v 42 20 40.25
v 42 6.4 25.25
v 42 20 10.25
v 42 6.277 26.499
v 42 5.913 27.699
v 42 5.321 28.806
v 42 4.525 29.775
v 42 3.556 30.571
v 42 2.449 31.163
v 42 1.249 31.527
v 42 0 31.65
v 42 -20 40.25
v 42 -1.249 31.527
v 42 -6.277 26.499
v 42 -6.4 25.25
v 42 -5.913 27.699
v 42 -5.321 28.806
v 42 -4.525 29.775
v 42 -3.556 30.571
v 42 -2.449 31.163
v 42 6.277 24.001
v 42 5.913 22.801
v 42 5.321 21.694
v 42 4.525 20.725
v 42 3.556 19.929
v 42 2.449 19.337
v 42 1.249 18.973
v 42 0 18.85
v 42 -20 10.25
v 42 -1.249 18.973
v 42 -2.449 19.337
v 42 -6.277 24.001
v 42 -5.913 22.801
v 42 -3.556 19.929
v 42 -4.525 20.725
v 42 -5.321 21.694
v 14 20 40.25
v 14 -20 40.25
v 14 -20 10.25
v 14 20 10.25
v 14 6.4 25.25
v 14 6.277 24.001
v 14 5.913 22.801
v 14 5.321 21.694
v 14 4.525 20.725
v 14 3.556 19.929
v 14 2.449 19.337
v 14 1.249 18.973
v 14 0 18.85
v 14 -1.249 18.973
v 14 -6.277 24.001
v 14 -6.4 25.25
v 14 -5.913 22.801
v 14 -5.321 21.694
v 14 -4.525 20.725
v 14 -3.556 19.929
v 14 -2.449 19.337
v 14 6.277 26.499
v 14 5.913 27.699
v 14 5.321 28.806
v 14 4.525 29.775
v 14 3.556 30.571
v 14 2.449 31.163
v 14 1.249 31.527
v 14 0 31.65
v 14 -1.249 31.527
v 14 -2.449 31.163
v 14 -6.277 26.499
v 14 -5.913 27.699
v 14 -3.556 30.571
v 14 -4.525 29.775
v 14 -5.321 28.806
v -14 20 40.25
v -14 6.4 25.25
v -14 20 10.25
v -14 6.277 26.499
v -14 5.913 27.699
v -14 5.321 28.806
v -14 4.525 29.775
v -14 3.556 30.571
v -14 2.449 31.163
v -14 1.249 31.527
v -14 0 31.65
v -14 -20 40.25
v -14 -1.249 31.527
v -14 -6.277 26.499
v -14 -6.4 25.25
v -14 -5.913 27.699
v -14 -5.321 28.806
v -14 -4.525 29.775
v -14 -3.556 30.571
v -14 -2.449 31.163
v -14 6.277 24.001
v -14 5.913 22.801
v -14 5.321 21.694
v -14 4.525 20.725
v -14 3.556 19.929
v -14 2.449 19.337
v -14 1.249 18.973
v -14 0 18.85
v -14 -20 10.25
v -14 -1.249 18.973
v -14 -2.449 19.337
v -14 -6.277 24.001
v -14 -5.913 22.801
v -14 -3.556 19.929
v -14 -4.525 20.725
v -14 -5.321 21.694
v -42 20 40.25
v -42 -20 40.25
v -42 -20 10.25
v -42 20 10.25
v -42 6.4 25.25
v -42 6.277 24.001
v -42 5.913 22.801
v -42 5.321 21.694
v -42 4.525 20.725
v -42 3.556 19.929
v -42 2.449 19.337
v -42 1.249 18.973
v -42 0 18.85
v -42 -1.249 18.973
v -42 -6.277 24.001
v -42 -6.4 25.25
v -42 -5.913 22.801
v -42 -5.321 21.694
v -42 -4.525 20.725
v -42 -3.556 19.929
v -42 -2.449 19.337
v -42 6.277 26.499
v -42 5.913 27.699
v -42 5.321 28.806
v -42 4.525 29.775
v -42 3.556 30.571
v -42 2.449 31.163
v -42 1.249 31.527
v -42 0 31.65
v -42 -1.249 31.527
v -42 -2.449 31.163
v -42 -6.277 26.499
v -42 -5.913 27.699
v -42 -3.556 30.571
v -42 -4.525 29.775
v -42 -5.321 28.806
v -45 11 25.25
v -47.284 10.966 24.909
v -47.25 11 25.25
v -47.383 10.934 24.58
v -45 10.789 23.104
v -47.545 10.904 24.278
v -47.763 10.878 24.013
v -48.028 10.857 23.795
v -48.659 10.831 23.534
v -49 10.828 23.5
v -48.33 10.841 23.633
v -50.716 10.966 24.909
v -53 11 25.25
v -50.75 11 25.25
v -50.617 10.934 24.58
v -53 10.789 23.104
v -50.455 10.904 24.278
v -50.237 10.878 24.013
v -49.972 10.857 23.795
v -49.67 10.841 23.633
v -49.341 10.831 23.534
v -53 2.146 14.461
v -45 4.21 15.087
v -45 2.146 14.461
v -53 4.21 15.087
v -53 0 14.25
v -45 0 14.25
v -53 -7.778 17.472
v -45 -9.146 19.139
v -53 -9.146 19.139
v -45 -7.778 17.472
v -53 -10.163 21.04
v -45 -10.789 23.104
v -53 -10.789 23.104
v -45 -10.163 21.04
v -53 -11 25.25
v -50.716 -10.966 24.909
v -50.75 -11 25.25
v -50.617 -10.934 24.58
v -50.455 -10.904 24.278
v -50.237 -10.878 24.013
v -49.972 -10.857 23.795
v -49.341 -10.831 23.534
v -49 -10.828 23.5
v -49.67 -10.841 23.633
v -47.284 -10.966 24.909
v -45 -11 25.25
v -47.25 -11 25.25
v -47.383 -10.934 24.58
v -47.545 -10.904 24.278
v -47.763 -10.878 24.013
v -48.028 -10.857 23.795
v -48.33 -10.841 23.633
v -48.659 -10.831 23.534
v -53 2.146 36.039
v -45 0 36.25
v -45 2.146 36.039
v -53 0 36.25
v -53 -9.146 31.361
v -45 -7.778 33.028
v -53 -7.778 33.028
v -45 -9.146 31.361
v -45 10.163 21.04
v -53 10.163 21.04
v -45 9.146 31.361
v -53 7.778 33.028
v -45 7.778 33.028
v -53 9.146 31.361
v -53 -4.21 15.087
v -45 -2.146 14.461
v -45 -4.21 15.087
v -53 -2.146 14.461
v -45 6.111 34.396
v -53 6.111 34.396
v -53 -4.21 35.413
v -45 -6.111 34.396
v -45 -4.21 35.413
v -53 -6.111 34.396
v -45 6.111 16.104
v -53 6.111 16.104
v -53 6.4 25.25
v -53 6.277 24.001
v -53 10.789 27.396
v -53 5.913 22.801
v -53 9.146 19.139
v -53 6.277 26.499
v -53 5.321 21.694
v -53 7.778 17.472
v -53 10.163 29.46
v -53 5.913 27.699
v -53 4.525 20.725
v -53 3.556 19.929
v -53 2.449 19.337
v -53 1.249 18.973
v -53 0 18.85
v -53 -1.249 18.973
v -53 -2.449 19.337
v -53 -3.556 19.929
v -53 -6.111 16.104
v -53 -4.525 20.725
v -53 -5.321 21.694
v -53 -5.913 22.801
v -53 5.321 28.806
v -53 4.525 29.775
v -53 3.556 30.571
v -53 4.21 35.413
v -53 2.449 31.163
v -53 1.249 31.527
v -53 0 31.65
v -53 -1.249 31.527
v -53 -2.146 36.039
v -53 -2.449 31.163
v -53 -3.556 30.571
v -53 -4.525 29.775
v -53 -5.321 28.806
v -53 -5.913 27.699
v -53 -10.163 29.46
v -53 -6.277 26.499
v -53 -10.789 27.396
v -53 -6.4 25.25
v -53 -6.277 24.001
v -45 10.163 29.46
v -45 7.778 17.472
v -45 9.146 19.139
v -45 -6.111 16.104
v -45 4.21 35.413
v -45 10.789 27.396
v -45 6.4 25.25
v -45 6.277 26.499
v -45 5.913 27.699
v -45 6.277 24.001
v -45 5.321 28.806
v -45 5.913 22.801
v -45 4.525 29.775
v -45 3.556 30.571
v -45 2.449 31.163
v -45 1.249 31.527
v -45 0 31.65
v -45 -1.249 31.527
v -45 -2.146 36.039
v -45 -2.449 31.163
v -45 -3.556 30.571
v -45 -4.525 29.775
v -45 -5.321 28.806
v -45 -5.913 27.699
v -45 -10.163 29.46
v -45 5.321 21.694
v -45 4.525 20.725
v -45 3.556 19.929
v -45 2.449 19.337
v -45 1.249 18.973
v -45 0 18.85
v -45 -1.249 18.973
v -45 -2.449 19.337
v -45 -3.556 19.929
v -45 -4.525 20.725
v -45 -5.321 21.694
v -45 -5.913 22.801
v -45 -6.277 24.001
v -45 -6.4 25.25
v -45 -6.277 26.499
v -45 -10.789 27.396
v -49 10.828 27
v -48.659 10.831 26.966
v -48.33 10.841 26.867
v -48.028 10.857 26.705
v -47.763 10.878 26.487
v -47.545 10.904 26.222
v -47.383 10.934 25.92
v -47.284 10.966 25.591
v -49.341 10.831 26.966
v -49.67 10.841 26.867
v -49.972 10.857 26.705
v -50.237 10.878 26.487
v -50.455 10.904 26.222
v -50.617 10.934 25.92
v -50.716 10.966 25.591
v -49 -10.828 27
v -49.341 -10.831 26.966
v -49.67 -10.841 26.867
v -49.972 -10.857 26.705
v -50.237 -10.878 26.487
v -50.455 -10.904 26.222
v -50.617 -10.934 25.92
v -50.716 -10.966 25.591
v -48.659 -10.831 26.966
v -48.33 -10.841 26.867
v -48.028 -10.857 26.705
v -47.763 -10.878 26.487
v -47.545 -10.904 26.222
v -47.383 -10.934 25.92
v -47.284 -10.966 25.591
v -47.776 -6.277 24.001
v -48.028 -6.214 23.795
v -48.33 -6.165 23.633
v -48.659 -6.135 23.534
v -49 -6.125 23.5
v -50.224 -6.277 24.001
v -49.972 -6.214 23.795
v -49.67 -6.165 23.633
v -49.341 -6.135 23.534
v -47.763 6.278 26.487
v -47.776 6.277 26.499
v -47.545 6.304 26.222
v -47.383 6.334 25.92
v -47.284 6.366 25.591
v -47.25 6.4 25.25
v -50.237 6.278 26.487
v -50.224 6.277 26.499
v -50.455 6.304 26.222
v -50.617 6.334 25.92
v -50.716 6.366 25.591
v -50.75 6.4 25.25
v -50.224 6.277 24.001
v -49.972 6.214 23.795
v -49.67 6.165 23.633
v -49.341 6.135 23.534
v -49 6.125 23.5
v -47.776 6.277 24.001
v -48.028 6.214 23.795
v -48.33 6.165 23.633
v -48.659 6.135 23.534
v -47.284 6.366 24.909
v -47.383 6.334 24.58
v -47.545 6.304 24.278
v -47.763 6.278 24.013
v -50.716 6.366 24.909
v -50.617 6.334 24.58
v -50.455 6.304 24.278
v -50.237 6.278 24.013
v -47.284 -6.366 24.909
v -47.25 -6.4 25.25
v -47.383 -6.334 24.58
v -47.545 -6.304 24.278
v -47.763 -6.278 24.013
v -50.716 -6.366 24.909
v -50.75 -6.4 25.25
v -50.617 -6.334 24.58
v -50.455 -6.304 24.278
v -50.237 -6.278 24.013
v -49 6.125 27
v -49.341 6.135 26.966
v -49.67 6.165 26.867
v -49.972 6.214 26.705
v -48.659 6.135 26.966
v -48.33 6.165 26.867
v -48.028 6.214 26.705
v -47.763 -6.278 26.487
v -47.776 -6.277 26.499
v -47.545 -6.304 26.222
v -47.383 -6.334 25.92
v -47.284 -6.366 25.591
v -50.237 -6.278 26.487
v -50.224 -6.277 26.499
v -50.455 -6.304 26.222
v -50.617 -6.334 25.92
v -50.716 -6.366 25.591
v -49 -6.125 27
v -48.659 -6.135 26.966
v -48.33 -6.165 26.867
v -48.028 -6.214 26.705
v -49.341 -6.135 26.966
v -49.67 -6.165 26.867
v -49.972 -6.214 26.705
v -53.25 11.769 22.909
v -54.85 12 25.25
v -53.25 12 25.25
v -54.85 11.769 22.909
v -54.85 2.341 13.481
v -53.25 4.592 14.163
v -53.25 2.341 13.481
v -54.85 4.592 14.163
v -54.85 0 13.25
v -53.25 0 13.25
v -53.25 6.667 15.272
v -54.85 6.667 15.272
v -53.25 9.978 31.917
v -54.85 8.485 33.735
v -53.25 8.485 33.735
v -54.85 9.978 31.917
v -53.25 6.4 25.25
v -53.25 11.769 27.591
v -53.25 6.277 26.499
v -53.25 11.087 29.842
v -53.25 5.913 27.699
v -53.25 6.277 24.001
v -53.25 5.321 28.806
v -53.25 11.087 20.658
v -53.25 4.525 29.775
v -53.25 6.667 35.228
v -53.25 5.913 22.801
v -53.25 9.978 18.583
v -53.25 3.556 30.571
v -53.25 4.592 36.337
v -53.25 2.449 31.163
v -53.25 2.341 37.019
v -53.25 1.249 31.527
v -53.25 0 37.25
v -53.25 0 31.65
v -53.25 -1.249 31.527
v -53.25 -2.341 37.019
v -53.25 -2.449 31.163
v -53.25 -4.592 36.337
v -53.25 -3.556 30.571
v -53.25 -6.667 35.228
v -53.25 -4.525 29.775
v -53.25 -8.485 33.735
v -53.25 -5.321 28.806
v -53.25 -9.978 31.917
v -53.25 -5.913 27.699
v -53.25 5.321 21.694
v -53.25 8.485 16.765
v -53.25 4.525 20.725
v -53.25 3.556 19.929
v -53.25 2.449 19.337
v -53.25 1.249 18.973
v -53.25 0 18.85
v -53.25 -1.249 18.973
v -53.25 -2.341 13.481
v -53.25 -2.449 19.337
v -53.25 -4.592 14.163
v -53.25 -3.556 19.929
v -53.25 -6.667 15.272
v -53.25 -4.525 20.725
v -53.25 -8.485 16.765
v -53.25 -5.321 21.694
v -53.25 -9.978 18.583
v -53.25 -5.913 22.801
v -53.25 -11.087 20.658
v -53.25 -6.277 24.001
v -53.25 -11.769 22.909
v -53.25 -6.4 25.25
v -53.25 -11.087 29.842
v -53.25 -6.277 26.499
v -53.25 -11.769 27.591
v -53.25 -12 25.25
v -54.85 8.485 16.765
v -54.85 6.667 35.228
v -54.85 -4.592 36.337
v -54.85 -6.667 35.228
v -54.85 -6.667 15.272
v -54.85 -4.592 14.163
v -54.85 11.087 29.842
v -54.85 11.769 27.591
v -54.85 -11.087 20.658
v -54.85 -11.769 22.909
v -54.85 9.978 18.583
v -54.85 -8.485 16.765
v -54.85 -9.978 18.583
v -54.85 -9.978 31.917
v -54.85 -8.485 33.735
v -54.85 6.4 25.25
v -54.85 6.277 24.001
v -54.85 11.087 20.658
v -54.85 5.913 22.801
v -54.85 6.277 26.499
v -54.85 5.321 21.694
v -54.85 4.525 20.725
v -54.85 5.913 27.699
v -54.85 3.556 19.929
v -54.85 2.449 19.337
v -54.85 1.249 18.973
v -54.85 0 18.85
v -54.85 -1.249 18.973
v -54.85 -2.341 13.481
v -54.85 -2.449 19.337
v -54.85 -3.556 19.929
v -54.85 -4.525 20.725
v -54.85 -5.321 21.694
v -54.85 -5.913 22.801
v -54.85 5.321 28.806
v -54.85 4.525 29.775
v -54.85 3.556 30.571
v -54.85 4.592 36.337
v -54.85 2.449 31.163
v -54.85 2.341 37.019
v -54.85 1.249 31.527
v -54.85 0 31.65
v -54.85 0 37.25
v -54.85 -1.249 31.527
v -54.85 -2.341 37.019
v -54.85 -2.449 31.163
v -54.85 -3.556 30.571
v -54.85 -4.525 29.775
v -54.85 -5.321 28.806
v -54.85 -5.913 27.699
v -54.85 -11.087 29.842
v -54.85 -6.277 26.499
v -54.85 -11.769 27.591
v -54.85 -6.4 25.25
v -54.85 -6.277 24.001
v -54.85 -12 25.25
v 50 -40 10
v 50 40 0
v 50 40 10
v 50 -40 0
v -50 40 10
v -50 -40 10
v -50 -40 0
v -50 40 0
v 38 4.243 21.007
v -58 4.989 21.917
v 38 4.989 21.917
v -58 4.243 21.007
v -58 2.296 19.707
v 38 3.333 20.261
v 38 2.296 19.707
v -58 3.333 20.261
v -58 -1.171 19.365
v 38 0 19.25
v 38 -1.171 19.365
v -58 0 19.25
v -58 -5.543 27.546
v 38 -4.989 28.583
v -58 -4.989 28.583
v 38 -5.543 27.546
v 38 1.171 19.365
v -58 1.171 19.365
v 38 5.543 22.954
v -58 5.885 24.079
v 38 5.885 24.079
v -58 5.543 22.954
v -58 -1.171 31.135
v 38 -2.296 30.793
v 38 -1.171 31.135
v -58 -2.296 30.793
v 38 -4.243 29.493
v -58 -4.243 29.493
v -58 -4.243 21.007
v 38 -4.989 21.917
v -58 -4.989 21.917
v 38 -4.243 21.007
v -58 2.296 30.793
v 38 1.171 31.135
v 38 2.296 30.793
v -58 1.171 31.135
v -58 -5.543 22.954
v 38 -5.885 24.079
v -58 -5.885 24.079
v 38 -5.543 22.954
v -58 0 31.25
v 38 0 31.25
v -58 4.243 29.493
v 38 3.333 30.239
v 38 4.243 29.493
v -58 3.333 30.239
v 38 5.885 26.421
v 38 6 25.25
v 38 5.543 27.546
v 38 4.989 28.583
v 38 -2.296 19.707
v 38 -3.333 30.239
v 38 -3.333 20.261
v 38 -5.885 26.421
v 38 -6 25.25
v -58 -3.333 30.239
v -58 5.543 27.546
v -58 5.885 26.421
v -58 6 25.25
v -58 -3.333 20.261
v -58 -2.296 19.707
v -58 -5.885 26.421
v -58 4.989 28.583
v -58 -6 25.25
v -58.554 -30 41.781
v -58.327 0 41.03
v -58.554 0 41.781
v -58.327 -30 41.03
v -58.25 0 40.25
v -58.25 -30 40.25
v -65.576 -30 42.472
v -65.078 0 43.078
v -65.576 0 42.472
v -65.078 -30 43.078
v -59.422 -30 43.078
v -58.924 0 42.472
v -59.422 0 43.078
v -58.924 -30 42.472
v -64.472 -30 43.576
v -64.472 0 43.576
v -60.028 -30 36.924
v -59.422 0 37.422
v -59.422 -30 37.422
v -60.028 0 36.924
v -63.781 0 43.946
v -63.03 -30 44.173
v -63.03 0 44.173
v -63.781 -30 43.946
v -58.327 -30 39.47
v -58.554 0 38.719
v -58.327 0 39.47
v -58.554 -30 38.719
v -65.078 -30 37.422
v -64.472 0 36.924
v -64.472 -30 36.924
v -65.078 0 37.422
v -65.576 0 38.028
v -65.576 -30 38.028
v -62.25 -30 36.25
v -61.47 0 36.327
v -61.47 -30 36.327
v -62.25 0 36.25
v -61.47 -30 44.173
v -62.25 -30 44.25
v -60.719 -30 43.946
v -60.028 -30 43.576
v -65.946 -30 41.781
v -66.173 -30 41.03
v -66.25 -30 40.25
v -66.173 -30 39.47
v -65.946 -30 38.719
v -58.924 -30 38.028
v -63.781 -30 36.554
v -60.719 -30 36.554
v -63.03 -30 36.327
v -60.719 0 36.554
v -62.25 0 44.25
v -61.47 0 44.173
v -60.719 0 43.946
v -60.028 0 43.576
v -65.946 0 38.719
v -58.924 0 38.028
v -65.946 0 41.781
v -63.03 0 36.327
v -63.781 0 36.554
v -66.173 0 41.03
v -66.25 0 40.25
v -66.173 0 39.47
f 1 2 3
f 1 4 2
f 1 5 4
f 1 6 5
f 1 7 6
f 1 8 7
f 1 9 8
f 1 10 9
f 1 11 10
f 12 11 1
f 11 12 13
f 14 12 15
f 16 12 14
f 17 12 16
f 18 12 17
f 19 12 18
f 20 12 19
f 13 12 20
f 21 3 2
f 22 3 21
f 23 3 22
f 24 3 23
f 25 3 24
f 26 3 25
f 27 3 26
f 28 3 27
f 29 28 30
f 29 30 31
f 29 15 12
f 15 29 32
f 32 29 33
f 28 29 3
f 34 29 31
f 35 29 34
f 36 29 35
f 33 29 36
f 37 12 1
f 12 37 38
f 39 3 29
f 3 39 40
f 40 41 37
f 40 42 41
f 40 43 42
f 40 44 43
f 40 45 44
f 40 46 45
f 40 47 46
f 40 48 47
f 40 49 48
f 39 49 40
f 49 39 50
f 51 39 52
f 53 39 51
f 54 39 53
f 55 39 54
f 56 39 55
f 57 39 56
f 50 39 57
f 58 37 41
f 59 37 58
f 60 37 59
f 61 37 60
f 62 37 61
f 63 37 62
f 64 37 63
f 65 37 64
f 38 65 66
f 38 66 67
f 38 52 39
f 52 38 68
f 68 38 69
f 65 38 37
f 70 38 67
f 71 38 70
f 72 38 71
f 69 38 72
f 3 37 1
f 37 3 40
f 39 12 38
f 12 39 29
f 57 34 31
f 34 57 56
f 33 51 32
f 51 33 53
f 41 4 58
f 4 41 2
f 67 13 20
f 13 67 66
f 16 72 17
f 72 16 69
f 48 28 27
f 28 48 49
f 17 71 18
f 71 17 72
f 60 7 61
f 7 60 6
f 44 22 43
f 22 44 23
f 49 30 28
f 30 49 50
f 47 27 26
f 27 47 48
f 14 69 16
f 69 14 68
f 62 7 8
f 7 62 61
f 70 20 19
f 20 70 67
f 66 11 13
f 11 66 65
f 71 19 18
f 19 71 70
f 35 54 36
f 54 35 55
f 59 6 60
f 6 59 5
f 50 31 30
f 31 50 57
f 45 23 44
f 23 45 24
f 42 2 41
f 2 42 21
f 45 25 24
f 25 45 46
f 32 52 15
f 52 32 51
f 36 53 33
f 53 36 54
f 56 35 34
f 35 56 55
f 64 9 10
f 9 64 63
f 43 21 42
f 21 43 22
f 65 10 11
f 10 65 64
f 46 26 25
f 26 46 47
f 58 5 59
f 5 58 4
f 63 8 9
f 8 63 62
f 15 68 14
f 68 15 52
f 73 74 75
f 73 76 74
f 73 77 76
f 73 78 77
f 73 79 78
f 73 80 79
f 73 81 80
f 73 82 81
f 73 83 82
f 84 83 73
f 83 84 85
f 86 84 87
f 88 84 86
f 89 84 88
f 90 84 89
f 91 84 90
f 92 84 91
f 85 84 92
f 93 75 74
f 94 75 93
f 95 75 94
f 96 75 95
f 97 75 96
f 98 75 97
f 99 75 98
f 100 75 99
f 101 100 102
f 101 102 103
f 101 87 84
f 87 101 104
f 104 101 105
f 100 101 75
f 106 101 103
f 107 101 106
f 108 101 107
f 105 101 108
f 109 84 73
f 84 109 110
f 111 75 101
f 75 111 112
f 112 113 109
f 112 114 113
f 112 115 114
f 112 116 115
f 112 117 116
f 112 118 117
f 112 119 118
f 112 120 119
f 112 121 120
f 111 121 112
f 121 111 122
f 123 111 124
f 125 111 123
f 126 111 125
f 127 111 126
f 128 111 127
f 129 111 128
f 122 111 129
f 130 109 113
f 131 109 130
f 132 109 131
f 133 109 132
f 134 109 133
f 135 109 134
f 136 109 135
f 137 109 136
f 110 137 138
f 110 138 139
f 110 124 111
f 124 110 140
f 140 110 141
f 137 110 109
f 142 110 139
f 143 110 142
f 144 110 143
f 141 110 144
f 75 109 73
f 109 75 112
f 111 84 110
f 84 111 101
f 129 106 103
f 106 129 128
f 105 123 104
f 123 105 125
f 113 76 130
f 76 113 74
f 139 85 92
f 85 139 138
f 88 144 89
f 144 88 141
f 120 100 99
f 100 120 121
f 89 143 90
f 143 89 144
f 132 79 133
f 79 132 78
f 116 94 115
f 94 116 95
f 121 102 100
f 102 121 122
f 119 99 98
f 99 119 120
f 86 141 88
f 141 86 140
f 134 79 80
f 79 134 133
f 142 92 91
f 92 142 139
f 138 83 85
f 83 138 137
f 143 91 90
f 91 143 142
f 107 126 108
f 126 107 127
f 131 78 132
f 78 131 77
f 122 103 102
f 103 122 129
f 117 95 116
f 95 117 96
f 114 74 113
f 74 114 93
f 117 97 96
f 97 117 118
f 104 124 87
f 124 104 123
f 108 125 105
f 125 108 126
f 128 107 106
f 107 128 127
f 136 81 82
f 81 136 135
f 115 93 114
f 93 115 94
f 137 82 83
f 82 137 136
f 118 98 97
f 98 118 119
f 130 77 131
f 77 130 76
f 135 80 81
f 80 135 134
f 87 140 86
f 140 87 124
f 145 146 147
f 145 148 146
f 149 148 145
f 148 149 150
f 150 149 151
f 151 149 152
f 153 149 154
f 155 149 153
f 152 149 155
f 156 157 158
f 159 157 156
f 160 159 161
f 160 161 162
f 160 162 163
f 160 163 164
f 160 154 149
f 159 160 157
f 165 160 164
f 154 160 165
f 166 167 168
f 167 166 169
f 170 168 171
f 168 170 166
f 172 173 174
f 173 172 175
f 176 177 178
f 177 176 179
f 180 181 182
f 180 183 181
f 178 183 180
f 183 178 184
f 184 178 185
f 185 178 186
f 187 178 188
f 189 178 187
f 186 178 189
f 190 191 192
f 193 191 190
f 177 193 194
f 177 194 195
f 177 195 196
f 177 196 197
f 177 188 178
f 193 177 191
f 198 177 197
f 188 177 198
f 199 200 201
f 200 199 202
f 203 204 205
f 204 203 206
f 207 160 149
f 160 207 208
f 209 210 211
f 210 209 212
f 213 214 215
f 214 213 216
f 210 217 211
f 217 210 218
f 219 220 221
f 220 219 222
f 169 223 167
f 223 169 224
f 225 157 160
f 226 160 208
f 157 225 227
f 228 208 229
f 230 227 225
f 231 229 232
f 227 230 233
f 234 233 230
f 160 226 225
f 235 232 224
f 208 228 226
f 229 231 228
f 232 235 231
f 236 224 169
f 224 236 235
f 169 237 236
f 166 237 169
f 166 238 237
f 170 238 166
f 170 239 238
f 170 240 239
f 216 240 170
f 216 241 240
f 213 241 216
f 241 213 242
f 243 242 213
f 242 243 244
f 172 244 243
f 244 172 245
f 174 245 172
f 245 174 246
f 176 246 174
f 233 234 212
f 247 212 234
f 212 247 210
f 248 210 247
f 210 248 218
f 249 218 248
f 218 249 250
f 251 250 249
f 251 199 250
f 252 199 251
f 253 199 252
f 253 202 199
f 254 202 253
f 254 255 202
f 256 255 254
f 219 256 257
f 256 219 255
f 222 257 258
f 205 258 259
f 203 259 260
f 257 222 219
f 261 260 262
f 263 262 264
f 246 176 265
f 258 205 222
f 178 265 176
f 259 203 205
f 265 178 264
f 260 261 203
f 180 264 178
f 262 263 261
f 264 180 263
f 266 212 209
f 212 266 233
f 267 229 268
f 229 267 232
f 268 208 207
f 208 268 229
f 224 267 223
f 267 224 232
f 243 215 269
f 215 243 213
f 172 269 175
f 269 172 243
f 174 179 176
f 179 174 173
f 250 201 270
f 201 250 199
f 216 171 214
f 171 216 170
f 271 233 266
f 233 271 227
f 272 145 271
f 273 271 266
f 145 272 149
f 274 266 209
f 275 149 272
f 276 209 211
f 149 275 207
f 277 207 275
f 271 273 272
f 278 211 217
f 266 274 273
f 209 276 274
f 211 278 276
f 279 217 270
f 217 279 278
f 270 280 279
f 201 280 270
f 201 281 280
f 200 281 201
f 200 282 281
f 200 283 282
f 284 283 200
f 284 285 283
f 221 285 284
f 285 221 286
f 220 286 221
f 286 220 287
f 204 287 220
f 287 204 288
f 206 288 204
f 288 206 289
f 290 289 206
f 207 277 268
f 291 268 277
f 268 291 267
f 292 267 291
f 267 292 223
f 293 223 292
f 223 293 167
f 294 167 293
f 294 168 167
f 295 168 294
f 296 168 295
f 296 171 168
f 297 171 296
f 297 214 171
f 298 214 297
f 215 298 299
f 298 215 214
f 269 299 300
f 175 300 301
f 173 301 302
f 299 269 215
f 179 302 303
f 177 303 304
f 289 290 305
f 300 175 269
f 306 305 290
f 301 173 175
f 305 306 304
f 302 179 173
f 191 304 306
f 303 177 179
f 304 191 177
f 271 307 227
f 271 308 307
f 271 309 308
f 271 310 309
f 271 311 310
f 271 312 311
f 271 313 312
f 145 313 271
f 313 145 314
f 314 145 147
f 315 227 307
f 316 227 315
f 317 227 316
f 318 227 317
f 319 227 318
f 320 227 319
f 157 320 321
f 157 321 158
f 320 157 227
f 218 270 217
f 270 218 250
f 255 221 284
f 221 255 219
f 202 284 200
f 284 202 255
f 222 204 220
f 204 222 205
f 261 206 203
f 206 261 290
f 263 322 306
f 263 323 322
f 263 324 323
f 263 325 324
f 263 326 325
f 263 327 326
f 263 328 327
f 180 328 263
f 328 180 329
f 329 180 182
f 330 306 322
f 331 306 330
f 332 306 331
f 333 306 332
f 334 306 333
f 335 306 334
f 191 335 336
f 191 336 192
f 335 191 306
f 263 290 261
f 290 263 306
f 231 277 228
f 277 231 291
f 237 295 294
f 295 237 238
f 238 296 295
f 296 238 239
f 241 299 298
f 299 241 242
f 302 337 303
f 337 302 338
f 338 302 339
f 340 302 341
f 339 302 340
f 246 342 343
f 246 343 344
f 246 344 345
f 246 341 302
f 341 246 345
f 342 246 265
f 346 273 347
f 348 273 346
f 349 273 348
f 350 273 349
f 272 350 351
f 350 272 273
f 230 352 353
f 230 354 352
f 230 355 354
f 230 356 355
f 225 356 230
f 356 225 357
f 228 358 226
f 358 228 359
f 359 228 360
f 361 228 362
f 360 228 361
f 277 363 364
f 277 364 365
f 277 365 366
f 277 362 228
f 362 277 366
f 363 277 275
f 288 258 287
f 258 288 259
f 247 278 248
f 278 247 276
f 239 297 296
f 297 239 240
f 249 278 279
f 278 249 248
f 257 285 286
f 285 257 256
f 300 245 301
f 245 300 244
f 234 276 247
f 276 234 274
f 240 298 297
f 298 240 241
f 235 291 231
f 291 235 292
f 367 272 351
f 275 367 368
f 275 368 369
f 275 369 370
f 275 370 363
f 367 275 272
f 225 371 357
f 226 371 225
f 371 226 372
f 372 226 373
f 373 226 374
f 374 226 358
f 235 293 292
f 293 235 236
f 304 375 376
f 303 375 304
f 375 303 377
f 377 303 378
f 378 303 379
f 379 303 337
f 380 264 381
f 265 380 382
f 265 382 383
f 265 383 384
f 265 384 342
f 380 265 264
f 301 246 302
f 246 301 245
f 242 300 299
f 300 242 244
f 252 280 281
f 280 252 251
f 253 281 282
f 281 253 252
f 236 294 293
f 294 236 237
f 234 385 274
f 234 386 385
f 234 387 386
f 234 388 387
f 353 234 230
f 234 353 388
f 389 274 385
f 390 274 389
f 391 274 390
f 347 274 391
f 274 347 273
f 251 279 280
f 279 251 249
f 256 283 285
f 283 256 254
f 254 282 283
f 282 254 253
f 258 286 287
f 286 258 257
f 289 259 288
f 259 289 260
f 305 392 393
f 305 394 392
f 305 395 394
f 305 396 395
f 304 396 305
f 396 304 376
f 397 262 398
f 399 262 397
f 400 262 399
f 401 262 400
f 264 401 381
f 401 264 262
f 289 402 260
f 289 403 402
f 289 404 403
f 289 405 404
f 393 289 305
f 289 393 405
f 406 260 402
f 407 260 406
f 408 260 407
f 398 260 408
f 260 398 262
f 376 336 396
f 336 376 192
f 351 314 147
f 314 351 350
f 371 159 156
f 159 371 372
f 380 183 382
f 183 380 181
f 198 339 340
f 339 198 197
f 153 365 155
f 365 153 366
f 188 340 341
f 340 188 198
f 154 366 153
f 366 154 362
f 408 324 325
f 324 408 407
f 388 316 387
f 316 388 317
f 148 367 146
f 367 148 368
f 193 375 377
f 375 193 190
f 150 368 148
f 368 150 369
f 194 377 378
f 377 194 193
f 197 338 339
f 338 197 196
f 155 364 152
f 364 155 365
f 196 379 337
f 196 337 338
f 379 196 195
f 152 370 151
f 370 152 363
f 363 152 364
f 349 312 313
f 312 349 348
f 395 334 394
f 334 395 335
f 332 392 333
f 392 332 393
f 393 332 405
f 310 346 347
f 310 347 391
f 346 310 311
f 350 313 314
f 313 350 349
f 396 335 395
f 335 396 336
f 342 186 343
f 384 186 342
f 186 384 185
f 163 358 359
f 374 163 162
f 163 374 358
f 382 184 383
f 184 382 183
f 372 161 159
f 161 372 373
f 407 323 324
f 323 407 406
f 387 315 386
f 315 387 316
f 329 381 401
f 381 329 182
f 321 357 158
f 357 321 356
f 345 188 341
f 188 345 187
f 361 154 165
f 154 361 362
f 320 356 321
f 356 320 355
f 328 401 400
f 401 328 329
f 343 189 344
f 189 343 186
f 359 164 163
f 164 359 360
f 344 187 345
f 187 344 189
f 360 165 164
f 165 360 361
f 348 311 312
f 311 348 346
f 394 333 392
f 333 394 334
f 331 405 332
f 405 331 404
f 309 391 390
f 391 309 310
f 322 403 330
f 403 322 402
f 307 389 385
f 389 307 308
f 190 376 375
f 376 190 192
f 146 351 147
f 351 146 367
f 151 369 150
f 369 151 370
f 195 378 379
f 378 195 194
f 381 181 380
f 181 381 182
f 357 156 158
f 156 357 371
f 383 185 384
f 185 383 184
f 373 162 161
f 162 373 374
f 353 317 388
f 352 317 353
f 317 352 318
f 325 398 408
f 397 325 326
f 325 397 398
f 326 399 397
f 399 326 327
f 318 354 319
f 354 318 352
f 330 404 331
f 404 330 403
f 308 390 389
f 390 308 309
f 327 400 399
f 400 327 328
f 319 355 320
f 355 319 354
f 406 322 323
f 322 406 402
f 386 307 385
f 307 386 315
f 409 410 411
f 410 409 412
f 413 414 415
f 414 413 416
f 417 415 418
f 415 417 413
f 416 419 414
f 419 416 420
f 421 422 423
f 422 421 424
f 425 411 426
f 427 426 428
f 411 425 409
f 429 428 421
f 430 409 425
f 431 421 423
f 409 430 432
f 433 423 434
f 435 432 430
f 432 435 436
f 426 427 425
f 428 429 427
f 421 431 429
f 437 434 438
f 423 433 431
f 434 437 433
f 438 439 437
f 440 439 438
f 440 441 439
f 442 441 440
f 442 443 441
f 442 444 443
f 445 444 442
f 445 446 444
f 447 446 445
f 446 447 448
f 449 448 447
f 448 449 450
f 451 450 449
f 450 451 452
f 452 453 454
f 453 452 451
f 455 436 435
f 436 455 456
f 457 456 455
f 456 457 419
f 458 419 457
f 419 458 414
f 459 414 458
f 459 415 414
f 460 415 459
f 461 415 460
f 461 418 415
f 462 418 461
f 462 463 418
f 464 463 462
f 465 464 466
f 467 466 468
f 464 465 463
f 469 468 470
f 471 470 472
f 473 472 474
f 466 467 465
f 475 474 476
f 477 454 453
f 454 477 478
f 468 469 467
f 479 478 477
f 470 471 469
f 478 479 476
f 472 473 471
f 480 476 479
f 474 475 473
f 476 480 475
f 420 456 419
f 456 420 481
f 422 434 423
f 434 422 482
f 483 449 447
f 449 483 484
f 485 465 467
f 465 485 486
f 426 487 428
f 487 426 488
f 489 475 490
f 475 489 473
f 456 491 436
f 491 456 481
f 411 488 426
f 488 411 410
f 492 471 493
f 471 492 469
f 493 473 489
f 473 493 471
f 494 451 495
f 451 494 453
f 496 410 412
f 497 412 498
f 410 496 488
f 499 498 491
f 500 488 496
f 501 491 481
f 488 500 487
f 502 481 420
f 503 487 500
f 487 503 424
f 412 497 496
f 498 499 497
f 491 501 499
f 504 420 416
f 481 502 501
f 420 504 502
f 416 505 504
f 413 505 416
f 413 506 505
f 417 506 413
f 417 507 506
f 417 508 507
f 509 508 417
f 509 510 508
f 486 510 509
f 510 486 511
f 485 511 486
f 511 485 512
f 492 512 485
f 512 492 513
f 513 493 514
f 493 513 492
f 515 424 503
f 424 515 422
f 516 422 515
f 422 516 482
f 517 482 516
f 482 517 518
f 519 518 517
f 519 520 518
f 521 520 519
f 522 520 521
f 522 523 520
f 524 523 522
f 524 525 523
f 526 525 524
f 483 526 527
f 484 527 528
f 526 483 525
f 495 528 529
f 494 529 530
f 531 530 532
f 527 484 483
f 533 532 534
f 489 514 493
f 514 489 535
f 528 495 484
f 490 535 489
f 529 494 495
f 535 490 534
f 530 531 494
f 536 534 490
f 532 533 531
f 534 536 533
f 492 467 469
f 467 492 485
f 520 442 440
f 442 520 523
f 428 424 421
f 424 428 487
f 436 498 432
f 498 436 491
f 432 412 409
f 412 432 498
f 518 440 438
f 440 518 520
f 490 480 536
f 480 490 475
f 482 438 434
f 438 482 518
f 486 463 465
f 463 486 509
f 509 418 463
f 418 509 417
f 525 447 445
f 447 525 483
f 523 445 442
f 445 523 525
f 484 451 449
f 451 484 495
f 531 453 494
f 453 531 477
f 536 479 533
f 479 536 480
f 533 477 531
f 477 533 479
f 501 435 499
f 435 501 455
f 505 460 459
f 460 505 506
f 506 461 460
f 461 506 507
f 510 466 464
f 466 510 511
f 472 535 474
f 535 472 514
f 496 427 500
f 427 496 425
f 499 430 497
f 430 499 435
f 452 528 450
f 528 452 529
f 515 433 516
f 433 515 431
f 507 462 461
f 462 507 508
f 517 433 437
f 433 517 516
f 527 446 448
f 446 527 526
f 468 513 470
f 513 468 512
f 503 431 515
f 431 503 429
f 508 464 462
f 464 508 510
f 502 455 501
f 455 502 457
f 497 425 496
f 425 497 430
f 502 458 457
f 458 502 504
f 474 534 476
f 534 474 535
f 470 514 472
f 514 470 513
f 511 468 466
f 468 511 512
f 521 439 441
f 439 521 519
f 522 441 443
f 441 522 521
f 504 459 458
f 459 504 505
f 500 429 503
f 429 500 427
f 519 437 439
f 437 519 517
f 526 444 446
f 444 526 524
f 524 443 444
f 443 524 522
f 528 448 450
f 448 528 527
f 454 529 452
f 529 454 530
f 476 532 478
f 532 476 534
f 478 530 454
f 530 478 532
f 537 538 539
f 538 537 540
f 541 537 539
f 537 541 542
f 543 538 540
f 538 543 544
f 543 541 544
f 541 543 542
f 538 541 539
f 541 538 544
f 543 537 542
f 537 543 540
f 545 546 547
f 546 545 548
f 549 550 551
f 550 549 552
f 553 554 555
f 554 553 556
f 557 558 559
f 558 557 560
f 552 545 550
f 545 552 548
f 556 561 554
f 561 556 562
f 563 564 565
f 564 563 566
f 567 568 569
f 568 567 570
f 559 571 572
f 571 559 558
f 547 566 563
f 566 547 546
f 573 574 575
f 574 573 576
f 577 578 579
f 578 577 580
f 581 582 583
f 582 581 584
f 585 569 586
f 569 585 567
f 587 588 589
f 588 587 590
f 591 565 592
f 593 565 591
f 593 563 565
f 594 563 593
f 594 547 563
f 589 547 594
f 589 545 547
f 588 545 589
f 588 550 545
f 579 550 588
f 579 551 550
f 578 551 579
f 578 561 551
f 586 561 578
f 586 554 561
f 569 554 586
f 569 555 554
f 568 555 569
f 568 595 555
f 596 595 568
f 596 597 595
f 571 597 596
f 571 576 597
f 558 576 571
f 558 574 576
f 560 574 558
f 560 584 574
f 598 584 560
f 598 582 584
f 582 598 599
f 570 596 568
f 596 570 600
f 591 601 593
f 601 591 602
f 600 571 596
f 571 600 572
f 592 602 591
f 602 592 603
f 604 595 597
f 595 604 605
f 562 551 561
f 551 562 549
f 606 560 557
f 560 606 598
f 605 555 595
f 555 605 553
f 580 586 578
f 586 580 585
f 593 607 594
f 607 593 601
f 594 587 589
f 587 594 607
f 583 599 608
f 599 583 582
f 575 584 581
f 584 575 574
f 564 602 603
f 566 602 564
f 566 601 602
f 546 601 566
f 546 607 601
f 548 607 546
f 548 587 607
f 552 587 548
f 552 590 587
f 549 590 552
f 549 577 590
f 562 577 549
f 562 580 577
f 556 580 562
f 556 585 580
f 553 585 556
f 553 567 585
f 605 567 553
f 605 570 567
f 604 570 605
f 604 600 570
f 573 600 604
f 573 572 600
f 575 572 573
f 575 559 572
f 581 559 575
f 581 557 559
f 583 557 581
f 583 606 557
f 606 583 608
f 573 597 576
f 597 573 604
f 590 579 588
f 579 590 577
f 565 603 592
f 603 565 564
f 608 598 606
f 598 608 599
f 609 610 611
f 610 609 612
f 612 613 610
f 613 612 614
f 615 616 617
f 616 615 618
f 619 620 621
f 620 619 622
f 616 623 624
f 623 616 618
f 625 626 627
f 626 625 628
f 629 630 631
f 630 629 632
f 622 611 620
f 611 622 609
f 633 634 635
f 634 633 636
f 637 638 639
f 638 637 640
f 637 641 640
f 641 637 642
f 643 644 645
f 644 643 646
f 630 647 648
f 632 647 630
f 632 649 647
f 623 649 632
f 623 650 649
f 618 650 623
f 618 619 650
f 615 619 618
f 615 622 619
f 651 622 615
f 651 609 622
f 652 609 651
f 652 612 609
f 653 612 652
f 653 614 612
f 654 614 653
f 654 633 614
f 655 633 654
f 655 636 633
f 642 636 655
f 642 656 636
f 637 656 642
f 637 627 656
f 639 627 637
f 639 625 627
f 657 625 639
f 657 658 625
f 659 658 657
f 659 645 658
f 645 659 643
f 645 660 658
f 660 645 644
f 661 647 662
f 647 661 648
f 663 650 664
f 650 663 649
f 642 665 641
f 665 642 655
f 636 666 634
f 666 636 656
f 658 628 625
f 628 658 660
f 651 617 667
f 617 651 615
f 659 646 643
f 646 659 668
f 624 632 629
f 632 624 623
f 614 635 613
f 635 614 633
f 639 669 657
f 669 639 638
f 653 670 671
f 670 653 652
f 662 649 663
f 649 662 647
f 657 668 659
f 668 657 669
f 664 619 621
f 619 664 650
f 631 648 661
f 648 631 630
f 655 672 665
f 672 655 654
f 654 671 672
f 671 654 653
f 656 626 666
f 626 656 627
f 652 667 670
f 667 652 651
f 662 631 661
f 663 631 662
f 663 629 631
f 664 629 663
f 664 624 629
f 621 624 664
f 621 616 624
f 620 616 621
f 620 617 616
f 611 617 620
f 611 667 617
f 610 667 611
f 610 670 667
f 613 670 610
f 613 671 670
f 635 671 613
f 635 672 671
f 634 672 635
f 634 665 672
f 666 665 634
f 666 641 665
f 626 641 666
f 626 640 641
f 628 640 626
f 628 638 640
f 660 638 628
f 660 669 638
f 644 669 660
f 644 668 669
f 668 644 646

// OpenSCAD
$fn = 32;

// ------------------------------------------------------------------------
// Machine vise: screw d12, jaws 28 x 30 mm
// Every part is its own module, assembly() places every instance.
// ------------------------------------------------------------------------

// --- part 1 ---
module vise_bed() {
  difference() {
    translate([-50, -40, 0]) cube([100, 80, 10]);
  }
}

// --- part 2 ---
module vise_jaw() {
  difference() {
    translate([-14, -20, 0]) cube([28, 40, 30]);
    translate([0, 0, 15]) rotate([0, 90, 0]) cylinder(h = 30, d = 12.8, center = true);
  }
}

// --- part 3 ---
module vise_screw() {
  translate([0, 0, -48]) cylinder(h = 96, d = 12);
}

// --- part 4 ---
module screw_collar() {
  difference() {
    cylinder(h = 8, d = 22);
    translate([0, 0, -1]) cylinder(h = 10, d = 12.8);
    translate([0, 0, 4]) rotate([90, 0, 0]) cylinder(h = 24, d = 3.5, center = true);
  }
}

// --- part 5 ---
module screw_washer() {
  difference() {
      translate([0, 0, 0]) cylinder(h = 1.6, d = 24);
      translate([0, 0, -1]) cylinder(h = 3.6, d = 12.8);
    }
}

// --- part 6 ---
module vise_handle() {
  cylinder(h = 30, d = 8);
}

// --- assembly ---
module assembly() {
  color([0.80, 0.24, 0.20]) translate([0, 0, 0]) rotate([0, 0, 0]) vise_bed();
  color([0.20, 0.45, 0.75]) translate([28, 0, 10.25]) rotate([0, 0, 0]) vise_jaw();
  color([0.25, 0.62, 0.32]) translate([-28, 0, 10.25]) rotate([0, 0, 0]) vise_jaw();
  color([0.92, 0.70, 0.18]) translate([-10, 0, 25.25]) rotate([0, 90, 0]) vise_screw();
  color([0.58, 0.35, 0.70]) translate([-53, 0, 25.25]) rotate([0, 90, 0]) screw_collar();
  color([0.16, 0.66, 0.66]) translate([-54.85, 0, 25.25]) rotate([0, 90, 0]) screw_washer();
  color([0.85, 0.48, 0.18]) translate([-62.25, 0, 40.25]) rotate([90, 0, 0]) vise_handle();
}

assembly();
